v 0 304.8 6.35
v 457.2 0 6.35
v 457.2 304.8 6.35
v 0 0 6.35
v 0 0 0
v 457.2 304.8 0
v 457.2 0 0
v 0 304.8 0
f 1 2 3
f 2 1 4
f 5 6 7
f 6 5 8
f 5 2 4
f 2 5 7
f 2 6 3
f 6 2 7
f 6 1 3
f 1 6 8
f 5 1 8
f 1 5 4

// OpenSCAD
inch = 25.4;

shelf_x = 18 * inch;
shelf_y = 12 * inch;
shelf_z = .25 * inch;
shelf_wall_x = 1;
shelf_wall_y = 1;
shelf_wall_z = 1;

color([0, .5, 0]) {
    cube([shelf_x, shelf_y, shelf_z]);
}
